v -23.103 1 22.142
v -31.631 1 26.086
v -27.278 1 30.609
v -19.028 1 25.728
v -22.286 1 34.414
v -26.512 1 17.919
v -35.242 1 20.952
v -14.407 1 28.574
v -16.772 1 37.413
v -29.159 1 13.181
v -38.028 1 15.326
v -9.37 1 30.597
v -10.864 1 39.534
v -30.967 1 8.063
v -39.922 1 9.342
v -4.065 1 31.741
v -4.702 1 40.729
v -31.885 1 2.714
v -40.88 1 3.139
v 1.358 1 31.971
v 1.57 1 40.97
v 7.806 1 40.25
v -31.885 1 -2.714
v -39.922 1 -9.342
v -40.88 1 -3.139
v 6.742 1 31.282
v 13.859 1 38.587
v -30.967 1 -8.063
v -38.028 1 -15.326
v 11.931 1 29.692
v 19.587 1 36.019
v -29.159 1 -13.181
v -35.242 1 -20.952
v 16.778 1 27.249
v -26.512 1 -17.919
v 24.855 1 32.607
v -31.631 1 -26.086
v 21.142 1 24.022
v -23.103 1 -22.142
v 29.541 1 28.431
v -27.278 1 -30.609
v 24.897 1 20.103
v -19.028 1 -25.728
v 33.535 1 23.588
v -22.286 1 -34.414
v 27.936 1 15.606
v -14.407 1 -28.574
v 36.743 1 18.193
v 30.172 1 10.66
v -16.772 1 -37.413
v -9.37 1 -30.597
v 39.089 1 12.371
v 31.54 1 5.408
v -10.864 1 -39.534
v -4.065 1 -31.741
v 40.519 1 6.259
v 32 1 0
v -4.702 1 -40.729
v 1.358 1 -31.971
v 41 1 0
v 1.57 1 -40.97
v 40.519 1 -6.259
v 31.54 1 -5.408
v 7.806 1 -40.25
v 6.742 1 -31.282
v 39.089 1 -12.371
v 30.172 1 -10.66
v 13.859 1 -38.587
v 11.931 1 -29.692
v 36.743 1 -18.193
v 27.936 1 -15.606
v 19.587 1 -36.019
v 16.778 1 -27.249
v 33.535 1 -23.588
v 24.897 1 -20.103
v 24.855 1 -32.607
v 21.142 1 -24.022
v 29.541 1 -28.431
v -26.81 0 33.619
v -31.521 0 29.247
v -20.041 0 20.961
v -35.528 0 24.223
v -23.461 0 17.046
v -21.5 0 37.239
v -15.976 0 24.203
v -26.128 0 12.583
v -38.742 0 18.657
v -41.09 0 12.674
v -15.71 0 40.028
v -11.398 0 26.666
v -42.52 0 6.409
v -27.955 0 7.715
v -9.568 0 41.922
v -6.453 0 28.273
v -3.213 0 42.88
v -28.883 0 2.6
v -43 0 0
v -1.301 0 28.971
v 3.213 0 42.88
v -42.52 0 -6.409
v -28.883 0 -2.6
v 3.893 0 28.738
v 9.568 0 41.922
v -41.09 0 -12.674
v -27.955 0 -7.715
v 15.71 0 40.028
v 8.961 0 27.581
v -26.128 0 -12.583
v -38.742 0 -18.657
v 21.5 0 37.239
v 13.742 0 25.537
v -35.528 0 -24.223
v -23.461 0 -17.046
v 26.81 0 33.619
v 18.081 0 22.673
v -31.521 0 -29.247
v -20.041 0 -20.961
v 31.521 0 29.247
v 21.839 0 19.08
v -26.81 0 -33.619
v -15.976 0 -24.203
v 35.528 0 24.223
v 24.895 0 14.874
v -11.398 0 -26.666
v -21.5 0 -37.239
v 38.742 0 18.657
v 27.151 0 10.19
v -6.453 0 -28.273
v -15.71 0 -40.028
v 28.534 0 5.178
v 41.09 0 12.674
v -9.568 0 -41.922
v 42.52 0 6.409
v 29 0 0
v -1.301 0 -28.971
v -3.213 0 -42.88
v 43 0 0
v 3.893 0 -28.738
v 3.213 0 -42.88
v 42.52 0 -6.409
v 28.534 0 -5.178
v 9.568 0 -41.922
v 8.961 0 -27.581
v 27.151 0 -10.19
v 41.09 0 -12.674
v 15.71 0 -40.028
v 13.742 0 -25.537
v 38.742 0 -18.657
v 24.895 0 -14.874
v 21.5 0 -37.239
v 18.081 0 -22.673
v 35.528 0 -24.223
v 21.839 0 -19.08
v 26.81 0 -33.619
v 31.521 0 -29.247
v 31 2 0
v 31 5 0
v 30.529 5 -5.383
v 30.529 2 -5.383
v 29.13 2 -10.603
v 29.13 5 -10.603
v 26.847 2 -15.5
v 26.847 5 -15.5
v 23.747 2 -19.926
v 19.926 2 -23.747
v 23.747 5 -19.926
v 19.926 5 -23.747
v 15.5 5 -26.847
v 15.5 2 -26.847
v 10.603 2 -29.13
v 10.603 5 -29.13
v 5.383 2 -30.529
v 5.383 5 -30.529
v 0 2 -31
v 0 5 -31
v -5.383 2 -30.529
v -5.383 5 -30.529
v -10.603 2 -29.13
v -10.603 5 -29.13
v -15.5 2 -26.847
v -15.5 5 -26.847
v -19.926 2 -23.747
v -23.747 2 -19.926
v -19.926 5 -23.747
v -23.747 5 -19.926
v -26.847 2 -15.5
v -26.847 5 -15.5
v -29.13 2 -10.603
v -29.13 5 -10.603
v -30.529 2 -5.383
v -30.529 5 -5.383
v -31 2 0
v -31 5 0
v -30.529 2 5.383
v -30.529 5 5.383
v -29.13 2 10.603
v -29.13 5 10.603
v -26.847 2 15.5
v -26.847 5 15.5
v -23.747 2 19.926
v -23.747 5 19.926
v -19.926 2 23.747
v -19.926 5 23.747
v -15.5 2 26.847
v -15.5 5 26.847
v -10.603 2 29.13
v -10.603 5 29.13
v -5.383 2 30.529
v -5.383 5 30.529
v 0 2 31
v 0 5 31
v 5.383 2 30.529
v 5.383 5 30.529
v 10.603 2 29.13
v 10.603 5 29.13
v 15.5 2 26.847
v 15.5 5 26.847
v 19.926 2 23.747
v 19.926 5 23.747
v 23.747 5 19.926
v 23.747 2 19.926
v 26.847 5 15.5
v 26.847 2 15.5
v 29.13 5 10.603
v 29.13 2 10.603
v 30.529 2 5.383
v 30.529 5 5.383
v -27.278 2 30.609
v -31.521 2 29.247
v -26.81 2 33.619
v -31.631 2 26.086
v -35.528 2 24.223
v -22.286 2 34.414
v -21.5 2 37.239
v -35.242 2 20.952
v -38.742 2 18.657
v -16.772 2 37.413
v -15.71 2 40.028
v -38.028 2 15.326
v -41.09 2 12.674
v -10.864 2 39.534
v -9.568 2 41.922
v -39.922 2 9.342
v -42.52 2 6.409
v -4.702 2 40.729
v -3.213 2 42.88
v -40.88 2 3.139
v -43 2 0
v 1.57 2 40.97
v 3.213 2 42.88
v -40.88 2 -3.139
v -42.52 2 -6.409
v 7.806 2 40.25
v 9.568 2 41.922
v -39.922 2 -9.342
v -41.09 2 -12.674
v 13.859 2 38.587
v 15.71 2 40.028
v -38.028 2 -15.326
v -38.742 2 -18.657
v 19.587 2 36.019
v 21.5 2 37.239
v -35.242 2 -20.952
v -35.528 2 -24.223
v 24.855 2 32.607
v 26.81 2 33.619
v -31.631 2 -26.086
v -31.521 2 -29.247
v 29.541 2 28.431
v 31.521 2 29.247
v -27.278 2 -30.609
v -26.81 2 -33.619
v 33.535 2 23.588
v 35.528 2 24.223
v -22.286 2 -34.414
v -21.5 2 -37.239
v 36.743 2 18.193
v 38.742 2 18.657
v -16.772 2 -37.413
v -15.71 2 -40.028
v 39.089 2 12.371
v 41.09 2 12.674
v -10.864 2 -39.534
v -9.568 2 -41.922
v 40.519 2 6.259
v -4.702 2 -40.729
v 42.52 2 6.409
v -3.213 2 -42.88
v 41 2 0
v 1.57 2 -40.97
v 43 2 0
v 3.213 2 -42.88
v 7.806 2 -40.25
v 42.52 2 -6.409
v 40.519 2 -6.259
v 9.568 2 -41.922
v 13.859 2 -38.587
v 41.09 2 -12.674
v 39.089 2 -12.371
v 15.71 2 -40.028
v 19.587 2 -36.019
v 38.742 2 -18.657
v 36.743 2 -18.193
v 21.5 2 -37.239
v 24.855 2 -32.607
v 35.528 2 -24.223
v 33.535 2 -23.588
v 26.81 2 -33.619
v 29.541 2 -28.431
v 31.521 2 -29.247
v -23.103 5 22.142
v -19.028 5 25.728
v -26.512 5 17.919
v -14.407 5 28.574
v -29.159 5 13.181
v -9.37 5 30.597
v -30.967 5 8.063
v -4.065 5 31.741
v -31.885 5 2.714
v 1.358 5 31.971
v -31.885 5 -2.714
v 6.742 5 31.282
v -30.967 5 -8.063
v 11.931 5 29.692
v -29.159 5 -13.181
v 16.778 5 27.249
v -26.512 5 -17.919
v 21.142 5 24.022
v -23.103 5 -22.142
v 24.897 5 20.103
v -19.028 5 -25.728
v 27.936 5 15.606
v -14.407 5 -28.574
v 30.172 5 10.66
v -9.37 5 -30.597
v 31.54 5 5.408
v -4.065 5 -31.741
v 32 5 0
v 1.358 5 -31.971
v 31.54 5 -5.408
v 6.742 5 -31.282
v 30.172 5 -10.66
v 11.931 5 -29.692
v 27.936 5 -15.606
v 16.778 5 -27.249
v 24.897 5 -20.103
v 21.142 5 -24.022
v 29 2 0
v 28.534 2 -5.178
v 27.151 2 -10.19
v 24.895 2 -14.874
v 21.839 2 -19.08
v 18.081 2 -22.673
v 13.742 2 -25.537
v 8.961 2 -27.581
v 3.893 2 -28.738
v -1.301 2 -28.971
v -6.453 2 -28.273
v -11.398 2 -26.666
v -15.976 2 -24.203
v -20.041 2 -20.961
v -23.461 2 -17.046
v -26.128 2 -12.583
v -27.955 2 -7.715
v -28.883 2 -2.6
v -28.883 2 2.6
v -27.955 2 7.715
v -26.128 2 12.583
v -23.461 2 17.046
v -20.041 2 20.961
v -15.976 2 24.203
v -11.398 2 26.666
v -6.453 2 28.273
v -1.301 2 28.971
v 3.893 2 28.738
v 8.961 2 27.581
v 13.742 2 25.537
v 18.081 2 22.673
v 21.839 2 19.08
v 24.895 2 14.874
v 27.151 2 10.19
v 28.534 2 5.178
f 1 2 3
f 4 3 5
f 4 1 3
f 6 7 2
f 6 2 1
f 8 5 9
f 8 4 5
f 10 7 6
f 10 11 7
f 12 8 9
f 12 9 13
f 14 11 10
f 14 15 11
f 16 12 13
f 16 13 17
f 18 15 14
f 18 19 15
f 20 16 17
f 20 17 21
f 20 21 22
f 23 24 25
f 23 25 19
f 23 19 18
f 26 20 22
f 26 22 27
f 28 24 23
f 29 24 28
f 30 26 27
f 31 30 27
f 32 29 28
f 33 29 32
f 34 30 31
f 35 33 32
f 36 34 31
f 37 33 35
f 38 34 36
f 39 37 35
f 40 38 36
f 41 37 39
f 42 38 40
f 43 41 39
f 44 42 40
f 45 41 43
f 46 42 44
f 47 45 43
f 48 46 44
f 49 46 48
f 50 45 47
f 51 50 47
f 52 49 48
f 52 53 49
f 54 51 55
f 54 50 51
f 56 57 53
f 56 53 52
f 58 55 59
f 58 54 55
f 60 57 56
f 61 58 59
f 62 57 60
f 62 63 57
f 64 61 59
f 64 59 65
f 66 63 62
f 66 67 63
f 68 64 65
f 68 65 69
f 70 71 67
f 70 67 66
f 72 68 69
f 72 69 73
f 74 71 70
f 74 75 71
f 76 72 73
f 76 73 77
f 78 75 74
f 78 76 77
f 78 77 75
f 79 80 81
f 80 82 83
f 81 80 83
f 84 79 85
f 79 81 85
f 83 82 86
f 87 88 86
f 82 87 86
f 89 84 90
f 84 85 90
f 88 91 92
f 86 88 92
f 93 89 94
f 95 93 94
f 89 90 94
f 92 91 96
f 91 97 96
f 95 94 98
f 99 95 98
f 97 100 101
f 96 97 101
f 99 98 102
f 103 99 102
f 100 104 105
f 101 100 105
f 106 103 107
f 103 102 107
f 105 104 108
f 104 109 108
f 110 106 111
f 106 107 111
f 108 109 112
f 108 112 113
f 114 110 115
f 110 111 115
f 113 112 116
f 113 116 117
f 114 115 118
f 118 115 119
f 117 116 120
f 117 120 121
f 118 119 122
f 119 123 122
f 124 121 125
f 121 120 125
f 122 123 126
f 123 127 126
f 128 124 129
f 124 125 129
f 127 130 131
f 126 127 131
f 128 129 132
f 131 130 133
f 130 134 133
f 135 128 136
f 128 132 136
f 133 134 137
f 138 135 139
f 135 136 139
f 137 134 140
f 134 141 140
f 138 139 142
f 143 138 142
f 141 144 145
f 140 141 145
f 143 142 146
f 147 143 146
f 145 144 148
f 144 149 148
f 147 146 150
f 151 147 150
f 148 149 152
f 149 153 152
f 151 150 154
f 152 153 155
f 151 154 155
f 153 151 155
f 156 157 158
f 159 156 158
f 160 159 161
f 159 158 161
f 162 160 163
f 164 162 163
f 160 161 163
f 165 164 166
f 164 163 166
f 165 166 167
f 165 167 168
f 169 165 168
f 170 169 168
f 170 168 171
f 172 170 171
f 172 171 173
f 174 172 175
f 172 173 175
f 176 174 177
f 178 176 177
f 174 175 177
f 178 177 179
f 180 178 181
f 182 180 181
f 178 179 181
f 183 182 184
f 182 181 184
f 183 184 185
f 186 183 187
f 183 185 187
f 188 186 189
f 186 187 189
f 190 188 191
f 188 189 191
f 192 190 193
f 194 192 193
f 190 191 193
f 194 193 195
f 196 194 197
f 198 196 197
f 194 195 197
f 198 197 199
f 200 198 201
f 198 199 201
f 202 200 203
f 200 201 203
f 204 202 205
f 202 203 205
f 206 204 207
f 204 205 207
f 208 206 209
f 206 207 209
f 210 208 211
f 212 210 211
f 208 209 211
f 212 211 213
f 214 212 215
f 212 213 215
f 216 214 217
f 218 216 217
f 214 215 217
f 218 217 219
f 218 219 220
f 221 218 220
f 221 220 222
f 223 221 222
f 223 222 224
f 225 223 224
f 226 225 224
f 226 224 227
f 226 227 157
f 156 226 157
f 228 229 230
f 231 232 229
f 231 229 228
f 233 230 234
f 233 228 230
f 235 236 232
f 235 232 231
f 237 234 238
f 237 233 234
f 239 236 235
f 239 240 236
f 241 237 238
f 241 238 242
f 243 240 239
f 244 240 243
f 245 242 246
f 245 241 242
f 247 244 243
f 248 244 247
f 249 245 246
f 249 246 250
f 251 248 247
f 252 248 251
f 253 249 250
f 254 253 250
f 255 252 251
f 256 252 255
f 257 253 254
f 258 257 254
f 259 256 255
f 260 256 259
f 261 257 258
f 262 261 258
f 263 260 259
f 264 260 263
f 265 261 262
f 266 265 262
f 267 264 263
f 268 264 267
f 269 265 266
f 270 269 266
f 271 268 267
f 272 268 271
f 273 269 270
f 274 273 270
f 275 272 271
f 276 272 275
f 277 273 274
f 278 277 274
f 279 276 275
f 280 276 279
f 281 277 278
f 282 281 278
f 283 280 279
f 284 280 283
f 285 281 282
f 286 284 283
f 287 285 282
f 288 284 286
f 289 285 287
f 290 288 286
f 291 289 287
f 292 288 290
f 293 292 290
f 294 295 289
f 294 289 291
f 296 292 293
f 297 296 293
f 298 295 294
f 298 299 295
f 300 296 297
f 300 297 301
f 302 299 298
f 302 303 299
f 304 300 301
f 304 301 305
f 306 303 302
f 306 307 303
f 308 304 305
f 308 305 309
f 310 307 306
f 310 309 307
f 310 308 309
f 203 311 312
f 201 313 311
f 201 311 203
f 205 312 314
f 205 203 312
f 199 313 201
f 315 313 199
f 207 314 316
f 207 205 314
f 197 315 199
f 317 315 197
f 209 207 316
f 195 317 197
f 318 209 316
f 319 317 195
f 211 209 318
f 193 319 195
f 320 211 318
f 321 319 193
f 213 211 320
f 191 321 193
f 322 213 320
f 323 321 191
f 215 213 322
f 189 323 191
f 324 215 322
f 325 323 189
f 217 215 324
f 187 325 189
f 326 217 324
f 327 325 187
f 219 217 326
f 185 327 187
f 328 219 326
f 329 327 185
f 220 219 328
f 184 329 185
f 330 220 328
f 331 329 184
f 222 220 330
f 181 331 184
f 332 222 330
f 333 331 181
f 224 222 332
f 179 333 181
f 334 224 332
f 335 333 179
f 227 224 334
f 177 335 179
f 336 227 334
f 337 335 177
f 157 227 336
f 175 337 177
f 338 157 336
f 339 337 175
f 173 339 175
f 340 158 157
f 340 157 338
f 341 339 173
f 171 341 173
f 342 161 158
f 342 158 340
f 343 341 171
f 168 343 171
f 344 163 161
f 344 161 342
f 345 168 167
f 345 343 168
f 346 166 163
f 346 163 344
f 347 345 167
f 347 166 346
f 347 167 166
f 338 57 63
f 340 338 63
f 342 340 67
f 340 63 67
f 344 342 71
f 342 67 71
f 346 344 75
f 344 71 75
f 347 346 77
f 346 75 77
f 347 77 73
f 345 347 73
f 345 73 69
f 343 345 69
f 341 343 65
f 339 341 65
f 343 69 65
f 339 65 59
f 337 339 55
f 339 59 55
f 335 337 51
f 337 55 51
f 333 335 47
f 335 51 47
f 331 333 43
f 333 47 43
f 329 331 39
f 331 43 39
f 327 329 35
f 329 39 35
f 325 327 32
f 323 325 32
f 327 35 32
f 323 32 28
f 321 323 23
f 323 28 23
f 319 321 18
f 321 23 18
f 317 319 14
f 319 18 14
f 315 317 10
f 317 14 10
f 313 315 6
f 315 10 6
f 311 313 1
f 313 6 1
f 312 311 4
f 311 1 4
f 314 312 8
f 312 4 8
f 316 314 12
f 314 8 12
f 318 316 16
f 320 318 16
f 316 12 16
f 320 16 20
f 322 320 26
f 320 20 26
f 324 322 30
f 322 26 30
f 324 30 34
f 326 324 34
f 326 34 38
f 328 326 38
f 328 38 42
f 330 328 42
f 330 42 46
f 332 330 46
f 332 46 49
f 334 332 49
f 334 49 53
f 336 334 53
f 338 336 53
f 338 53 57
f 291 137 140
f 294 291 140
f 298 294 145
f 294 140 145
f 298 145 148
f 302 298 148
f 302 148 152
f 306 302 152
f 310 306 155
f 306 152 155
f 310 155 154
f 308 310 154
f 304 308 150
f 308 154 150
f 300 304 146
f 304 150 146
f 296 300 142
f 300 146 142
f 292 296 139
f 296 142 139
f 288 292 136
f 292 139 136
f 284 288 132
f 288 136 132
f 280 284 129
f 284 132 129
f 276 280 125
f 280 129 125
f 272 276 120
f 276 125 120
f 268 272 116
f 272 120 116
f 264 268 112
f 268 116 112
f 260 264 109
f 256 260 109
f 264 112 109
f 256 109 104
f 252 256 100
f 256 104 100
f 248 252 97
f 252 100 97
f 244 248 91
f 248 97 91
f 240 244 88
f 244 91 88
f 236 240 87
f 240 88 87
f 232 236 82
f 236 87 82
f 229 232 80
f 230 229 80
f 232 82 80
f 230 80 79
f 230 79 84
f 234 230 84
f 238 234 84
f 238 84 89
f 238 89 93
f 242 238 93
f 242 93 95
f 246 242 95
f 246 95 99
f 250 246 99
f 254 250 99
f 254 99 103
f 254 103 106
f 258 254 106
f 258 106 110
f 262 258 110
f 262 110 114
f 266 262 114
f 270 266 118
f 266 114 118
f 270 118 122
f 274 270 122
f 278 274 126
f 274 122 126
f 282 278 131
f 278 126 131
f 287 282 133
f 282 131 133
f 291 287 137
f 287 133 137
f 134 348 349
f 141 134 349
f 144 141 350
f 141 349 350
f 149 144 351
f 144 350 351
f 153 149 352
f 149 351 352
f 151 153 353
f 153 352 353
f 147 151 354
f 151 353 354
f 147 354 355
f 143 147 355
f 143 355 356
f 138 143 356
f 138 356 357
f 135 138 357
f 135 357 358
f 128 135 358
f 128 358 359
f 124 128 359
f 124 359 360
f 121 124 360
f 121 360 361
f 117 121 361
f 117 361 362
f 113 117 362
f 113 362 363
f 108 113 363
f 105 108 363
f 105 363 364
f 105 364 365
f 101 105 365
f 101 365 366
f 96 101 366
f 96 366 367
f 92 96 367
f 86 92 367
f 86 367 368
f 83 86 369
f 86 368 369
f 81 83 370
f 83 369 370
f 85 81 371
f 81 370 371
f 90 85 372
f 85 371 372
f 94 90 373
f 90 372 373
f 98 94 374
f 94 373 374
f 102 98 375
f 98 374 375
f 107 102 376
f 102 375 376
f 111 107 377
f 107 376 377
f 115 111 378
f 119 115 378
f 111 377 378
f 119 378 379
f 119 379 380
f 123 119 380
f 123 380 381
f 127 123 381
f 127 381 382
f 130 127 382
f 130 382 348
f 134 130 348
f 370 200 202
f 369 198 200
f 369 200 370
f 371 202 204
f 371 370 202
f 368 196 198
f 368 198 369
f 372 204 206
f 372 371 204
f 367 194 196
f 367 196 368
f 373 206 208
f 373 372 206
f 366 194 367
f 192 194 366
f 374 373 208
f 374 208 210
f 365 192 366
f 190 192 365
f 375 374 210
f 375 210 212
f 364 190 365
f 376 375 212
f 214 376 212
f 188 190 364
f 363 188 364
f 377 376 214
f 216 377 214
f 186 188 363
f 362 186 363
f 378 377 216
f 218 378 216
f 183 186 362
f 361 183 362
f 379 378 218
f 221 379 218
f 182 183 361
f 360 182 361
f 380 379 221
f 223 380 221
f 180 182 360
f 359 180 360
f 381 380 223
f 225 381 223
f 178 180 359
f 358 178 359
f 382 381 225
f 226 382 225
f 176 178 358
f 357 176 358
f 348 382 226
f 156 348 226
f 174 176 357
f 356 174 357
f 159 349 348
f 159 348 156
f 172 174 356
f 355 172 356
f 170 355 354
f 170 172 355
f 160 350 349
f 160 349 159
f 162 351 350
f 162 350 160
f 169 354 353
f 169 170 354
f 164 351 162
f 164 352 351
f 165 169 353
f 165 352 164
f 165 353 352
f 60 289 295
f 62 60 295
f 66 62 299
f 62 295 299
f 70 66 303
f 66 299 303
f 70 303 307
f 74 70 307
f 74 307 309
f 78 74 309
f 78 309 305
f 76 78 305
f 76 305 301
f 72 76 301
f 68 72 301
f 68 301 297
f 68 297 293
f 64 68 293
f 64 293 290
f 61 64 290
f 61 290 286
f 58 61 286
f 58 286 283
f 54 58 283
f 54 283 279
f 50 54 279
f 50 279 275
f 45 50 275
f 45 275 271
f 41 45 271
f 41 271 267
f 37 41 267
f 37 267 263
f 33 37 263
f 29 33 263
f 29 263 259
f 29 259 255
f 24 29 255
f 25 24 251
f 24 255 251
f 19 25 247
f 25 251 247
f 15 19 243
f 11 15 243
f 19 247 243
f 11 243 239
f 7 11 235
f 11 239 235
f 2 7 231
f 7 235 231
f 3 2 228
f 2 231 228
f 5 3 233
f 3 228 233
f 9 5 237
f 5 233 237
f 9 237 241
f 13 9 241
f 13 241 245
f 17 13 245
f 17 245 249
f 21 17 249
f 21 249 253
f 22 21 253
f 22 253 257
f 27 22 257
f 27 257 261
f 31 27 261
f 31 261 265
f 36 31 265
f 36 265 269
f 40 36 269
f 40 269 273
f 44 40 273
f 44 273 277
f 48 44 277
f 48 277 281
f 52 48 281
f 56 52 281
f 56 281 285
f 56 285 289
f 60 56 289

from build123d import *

# Parameters (mm, degrees)
SKETCH1_R           = 43
BOSS_EXTRUDE1_DEPTH = 2
SKETCH2_R           = 41
BOSS_EXTRUDE2_DEPTH = 3
SKETCH3_R           = 30
CUT_EXTRUDE1_DEPTH  = 2
SKETCH4_R           = 28
CUT_EXTRUDE2_DEPTH  = 4
SKETCH5_R           = 41
CUT_EXTRUDE3_DEPTH  = 4
SKETCH6_R           = 32
BOSS_EXTRUDE4_DEPTH = 4
SKETCH7_R           = 31
CUT_EXTRUDE4_DEPTH  = 3
SKETCH8_R           = 29
CUT_EXTRUDE5_DEPTH  = 3


with BuildPart() as part:
    # Sketch1 → Boss-Extrude1 (new body)
    with BuildSketch(Plane(origin=(0, 0, 0), x_dir=(1, 0, 0), z_dir=(0, 1, 0))):
        Circle(SKETCH1_R)
    extrude(amount=BOSS_EXTRUDE1_DEPTH)

    # Sketch2 → Boss-Extrude2 (add)
    with BuildSketch(Plane(origin=(0, 2, 0), x_dir=(1, 0, 0), z_dir=(0, 1, 0))):
        Circle(SKETCH2_R)
    extrude(amount=BOSS_EXTRUDE2_DEPTH)

    # Sketch3 → Cut-Extrude1 (cut)
    with BuildSketch(Plane(origin=(0, 5, 0), x_dir=(1, 0, 0), z_dir=(0, 1, 0))):
        Circle(SKETCH3_R)
    extrude(amount=-CUT_EXTRUDE1_DEPTH, mode=Mode.SUBTRACT)

    # Sketch4 → Cut-Extrude2 (cut, through all)
    with BuildSketch(Plane(origin=(0, 3, 0), x_dir=(1, 0, 0), z_dir=(0, 1, 0))):
        Circle(SKETCH4_R)
    extrude(amount=-CUT_EXTRUDE2_DEPTH, mode=Mode.SUBTRACT)

    # Sketch5 → Cut-Extrude3 (cut)
    with BuildSketch(Plane(origin=(0, 5, 0), x_dir=(1, 0, 0), z_dir=(0, 1, 0))):
        Circle(SKETCH5_R)
    extrude(amount=-CUT_EXTRUDE3_DEPTH, mode=Mode.SUBTRACT)

    # Sketch6 → Boss-Extrude4 (add)
    with BuildSketch(Plane(origin=(0, 1, 0), x_dir=(1, 0, 0), z_dir=(0, 1, 0))):
        Circle(SKETCH6_R)
    extrude(amount=BOSS_EXTRUDE4_DEPTH)

    # Sketch7 → Cut-Extrude4 (cut)
    with BuildSketch(Plane(origin=(0, 5, 0), x_dir=(1, 0, 0), z_dir=(0, 1, 0))):
        Circle(SKETCH7_R)
    extrude(amount=-CUT_EXTRUDE4_DEPTH, mode=Mode.SUBTRACT)

    # Sketch8 → Cut-Extrude5 (cut, through all)
    with BuildSketch(Plane(origin=(0, 2, 0), x_dir=(1, 0, 0), z_dir=(0, 1, 0))):
        Circle(SKETCH8_R)
    extrude(amount=-CUT_EXTRUDE5_DEPTH, mode=Mode.SUBTRACT)


solid = part.part
